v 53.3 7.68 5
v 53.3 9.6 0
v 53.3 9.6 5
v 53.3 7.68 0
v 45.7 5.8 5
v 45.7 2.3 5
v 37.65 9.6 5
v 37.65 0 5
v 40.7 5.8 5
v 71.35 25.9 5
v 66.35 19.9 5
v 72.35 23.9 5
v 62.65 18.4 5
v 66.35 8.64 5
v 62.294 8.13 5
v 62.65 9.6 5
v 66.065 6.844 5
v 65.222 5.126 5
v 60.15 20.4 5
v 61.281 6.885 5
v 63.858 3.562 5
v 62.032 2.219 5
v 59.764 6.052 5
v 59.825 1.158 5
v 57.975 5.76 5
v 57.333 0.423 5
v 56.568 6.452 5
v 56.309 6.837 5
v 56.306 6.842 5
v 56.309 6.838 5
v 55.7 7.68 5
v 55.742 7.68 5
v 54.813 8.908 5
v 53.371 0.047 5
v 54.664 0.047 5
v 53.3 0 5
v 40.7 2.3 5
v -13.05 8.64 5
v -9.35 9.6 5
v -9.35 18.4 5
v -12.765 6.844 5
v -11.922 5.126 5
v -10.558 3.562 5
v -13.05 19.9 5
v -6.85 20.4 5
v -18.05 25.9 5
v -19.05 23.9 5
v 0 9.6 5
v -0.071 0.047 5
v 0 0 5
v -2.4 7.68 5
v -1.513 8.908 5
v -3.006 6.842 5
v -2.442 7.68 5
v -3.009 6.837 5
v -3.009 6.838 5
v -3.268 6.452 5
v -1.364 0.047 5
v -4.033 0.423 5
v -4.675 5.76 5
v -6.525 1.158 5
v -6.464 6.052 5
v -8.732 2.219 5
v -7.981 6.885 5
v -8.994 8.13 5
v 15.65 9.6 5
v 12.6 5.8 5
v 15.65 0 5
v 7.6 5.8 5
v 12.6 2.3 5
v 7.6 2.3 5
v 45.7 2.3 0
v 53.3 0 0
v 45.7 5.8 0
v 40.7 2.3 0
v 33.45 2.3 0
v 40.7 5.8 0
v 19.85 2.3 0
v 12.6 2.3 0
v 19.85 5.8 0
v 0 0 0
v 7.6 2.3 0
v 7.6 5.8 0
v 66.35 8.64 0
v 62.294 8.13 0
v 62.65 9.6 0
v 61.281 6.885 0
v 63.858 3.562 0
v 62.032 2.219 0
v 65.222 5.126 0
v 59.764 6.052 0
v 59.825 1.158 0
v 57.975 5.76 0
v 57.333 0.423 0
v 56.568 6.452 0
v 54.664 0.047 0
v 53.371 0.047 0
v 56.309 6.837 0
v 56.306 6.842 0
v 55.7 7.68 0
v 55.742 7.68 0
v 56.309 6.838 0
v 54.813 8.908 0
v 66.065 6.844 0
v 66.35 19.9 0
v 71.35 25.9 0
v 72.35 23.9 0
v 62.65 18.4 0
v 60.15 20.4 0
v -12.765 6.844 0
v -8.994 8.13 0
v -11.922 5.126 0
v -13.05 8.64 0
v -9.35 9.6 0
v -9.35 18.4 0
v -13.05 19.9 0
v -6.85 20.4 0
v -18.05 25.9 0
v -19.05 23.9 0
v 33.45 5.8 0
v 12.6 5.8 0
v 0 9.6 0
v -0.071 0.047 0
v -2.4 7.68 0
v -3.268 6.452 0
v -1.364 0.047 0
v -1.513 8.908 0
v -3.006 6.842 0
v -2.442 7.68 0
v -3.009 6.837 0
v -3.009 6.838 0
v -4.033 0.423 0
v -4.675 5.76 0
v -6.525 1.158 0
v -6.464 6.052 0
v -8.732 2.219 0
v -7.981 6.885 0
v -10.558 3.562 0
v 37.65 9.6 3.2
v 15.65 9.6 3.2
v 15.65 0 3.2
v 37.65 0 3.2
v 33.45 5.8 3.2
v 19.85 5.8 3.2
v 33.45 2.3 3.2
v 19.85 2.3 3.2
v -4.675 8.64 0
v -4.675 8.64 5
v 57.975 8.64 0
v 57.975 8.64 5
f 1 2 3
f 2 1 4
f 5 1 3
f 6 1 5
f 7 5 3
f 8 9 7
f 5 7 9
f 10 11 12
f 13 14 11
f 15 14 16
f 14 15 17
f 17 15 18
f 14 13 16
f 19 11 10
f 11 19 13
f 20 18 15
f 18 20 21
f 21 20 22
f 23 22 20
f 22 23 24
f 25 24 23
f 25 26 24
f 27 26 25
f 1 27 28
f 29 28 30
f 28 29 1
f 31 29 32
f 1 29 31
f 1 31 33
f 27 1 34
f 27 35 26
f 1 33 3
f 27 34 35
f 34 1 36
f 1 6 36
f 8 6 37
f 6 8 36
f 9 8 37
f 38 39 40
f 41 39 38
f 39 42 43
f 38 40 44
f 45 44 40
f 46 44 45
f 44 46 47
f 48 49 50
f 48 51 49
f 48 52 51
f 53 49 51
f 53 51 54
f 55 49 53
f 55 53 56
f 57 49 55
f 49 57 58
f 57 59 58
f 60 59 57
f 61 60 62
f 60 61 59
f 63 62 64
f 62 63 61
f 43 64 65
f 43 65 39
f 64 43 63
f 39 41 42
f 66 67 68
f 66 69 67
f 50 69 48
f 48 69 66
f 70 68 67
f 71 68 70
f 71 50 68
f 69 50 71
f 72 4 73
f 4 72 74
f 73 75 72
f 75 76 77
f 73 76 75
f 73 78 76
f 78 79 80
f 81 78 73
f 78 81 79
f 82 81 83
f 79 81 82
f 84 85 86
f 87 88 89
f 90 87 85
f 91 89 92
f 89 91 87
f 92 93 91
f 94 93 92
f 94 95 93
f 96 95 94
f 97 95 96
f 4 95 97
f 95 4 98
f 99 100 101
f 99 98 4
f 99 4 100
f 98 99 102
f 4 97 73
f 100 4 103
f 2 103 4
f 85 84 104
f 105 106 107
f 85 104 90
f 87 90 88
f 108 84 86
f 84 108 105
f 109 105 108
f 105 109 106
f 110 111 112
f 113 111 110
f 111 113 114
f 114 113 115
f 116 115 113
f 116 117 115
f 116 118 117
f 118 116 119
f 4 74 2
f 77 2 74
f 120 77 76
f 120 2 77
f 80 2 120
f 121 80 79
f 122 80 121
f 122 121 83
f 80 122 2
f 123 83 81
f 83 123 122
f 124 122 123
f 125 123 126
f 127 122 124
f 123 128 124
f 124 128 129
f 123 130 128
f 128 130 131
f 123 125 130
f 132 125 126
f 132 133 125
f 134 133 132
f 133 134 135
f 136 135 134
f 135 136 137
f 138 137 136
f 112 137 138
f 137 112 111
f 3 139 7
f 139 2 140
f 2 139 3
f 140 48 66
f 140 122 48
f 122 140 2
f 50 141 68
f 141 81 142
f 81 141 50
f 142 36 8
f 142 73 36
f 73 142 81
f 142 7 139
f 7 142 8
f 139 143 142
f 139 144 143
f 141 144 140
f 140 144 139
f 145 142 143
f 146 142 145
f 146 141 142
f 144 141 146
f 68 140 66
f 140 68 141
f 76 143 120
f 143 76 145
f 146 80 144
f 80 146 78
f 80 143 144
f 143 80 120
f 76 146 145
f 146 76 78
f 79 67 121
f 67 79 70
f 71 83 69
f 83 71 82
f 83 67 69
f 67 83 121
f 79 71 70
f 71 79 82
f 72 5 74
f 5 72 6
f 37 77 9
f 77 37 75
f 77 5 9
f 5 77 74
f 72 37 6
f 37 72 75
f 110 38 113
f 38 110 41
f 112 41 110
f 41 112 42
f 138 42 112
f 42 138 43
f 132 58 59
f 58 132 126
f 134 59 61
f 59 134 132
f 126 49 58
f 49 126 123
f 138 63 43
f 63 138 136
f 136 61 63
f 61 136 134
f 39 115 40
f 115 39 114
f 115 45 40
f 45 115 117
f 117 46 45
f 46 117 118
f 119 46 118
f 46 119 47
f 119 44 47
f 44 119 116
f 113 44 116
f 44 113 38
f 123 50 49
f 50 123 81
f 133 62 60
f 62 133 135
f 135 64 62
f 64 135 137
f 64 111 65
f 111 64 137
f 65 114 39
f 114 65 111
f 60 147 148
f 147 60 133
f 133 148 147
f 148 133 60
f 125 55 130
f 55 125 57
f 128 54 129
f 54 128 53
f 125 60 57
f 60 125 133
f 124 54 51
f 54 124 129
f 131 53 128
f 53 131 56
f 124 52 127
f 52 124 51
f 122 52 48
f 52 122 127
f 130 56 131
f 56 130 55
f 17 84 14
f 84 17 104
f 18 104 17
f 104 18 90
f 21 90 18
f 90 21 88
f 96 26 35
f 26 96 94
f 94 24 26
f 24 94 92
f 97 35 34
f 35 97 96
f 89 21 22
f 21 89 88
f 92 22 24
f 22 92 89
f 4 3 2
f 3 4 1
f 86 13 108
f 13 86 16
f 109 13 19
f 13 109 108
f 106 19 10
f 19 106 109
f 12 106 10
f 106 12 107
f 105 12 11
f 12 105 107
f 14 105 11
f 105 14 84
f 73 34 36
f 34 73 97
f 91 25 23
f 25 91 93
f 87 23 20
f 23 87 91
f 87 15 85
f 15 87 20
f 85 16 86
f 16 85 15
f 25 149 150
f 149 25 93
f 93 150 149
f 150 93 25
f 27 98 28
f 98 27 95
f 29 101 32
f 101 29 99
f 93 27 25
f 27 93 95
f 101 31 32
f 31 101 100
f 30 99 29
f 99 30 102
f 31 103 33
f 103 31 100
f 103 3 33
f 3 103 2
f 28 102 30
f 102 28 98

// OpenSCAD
// in mm.  ZTE Speed is 66, Moto E4 is 72
phone_width = 72; // [54:0.5:100]

// in mm.  ZTE Speed is 10.2, Moto E4 is 9.3
phone_thickness = 9.3; //[5:0.1:20]

// in mm.  Original ServoCity clip thickness is 3.2, suggest 5 for added strength
clip_thickness=5; //[3.2:0.1:7.0]

// two clips or single clip?
two_clips="false"; //[true,false]

// hi res? may not work in customizer. :(
hi_res="false";

// preview[view:south, tilt:top]

/* [Hidden] */
ht=3.2;
cWid=3.7; // mm. width of clips

i2m = 25.4; // inches to mm

// base with slots
bLen=53.3;
bWid=9.6;

wholeClip();


if (two_clips=="true") {
translate([0,-3,0])
mirror([0,1,0])
wholeClip();
}

module wholeClip() {

difference() {
    
    cube([bLen, bWid, clip_thickness]);
    
    if (clip_thickness>3.2) {
    translate([bLen/2-(22)/2, 0,ht])
    cube([22, bWid+2, clip_thickness]);
    }
    
    translate([bLen/2-(13.3+0.3)/2, 2.3, -2])
    cube([13.3+0.3, ht+0.3, 10]);
    
    translate([bLen/2-1.5/2*i2m, 2.3, -2])
    cube([5,ht+0.3, 10]);
    
    translate([bLen/2+1.5/2*i2m -5, 2.3, -2])
    cube([5,ht+0.3, 10]);
}

clip();

translate([bLen,0,0])
mirror([1,0,0])
clip();
}

module clip() {
    
degr=10;
    
difference() {
union() {
// original clip    
linear_extrude(height=clip_thickness)
polygon([
[0,0],
[bLen/2 - phone_width/2-cWid, bWid*0.9],
[bLen/2 - phone_width/2-cWid, bWid+phone_thickness+1],
[bLen/2 - phone_width/2-6-cWid, bWid+phone_thickness+5],
[bLen/2 - phone_width/2-5-cWid, bWid+phone_thickness+7],
[bLen/2 - phone_width/2 +2.5, bWid+phone_thickness+1.5],
[bLen/2 - phone_width/2 , bWid+phone_thickness-0.5],
[bLen/2 - phone_width/2 , bWid],
     
[(bLen/2 - phone_width/2)/2 , bWid*0.8],
    
[0,bWid*0.8],
[1,bWid*0.8]]);

    
// 1/4 circle base
translate([0,bWid*0.9,0])
scale([bLen/2 - phone_width/2-cWid, bWid*0.9, 1])
rotate(180) quarterCylinder(60);
}

translate([(bLen/2 - phone_width/2)/2,bWid*0.8,-1])
cube([-(bLen/2 - phone_width/2)/2,bWid*(1-0.8), 1000]);

translate([(bLen/2 - phone_width/2)/2,bWid,0])
scale([(bLen/2 - phone_width/2)/2, bWid*0.4, 1])
rotate(180) quarterCylinder(32);

translate([(bLen/2 - phone_width/2)/2,bWid*0.6+bWid*0.2/(1-cos(degr)),0])
scale([(bLen/2 - phone_width/2)/4/(sin(degr)), bWid*0.2/(1-cos(degr)), 1])
rotate(-270) quarterCylinder(120);


}

intersection() {
if (hi_res=="true") {
translate([0.0*(bLen/2 -phone_width/2)/4,bWid-bWid*0.2/(1-cos(degr)),0])
scale([(bLen/2 - phone_width/2)/4/(sin(degr)), bWid*0.2/(1-cos(degr)), 1]) 
rotate(270)
quarterCylinder(120);
} else {
translate([0.0*(bLen/2 -phone_width/2)/4,bWid-bWid*0.2/(1-cos(degr)),0])
scale([(bLen/2 - phone_width/2)/4/(sin(degr)), bWid*0.2/(1-cos(degr)), 1]) 
rotate(270)
scale([1,1.075,1])
quarterCylinder(120);
}
    
translate([(bLen/2 - phone_width/2)/3,bWid*0.5,0])
cube(100);
    
}

module quarterCylinder(ne) {
rotate(180)
difference() {
  //  rotate(180/(ne*0.5))
if (hi_res=="true") {
cylinder(h=clip_thickness, r=1, $fn=ne*2);
} else {
cylinder(h=clip_thickness, r=1, $fn=ne*0.5);
}
translate([50, 0, -1]) 
    scale([-1,1,1])
cube(100);
translate([0, -50, -1]) scale([-1,1,1])
cube(100);
}
}

}
